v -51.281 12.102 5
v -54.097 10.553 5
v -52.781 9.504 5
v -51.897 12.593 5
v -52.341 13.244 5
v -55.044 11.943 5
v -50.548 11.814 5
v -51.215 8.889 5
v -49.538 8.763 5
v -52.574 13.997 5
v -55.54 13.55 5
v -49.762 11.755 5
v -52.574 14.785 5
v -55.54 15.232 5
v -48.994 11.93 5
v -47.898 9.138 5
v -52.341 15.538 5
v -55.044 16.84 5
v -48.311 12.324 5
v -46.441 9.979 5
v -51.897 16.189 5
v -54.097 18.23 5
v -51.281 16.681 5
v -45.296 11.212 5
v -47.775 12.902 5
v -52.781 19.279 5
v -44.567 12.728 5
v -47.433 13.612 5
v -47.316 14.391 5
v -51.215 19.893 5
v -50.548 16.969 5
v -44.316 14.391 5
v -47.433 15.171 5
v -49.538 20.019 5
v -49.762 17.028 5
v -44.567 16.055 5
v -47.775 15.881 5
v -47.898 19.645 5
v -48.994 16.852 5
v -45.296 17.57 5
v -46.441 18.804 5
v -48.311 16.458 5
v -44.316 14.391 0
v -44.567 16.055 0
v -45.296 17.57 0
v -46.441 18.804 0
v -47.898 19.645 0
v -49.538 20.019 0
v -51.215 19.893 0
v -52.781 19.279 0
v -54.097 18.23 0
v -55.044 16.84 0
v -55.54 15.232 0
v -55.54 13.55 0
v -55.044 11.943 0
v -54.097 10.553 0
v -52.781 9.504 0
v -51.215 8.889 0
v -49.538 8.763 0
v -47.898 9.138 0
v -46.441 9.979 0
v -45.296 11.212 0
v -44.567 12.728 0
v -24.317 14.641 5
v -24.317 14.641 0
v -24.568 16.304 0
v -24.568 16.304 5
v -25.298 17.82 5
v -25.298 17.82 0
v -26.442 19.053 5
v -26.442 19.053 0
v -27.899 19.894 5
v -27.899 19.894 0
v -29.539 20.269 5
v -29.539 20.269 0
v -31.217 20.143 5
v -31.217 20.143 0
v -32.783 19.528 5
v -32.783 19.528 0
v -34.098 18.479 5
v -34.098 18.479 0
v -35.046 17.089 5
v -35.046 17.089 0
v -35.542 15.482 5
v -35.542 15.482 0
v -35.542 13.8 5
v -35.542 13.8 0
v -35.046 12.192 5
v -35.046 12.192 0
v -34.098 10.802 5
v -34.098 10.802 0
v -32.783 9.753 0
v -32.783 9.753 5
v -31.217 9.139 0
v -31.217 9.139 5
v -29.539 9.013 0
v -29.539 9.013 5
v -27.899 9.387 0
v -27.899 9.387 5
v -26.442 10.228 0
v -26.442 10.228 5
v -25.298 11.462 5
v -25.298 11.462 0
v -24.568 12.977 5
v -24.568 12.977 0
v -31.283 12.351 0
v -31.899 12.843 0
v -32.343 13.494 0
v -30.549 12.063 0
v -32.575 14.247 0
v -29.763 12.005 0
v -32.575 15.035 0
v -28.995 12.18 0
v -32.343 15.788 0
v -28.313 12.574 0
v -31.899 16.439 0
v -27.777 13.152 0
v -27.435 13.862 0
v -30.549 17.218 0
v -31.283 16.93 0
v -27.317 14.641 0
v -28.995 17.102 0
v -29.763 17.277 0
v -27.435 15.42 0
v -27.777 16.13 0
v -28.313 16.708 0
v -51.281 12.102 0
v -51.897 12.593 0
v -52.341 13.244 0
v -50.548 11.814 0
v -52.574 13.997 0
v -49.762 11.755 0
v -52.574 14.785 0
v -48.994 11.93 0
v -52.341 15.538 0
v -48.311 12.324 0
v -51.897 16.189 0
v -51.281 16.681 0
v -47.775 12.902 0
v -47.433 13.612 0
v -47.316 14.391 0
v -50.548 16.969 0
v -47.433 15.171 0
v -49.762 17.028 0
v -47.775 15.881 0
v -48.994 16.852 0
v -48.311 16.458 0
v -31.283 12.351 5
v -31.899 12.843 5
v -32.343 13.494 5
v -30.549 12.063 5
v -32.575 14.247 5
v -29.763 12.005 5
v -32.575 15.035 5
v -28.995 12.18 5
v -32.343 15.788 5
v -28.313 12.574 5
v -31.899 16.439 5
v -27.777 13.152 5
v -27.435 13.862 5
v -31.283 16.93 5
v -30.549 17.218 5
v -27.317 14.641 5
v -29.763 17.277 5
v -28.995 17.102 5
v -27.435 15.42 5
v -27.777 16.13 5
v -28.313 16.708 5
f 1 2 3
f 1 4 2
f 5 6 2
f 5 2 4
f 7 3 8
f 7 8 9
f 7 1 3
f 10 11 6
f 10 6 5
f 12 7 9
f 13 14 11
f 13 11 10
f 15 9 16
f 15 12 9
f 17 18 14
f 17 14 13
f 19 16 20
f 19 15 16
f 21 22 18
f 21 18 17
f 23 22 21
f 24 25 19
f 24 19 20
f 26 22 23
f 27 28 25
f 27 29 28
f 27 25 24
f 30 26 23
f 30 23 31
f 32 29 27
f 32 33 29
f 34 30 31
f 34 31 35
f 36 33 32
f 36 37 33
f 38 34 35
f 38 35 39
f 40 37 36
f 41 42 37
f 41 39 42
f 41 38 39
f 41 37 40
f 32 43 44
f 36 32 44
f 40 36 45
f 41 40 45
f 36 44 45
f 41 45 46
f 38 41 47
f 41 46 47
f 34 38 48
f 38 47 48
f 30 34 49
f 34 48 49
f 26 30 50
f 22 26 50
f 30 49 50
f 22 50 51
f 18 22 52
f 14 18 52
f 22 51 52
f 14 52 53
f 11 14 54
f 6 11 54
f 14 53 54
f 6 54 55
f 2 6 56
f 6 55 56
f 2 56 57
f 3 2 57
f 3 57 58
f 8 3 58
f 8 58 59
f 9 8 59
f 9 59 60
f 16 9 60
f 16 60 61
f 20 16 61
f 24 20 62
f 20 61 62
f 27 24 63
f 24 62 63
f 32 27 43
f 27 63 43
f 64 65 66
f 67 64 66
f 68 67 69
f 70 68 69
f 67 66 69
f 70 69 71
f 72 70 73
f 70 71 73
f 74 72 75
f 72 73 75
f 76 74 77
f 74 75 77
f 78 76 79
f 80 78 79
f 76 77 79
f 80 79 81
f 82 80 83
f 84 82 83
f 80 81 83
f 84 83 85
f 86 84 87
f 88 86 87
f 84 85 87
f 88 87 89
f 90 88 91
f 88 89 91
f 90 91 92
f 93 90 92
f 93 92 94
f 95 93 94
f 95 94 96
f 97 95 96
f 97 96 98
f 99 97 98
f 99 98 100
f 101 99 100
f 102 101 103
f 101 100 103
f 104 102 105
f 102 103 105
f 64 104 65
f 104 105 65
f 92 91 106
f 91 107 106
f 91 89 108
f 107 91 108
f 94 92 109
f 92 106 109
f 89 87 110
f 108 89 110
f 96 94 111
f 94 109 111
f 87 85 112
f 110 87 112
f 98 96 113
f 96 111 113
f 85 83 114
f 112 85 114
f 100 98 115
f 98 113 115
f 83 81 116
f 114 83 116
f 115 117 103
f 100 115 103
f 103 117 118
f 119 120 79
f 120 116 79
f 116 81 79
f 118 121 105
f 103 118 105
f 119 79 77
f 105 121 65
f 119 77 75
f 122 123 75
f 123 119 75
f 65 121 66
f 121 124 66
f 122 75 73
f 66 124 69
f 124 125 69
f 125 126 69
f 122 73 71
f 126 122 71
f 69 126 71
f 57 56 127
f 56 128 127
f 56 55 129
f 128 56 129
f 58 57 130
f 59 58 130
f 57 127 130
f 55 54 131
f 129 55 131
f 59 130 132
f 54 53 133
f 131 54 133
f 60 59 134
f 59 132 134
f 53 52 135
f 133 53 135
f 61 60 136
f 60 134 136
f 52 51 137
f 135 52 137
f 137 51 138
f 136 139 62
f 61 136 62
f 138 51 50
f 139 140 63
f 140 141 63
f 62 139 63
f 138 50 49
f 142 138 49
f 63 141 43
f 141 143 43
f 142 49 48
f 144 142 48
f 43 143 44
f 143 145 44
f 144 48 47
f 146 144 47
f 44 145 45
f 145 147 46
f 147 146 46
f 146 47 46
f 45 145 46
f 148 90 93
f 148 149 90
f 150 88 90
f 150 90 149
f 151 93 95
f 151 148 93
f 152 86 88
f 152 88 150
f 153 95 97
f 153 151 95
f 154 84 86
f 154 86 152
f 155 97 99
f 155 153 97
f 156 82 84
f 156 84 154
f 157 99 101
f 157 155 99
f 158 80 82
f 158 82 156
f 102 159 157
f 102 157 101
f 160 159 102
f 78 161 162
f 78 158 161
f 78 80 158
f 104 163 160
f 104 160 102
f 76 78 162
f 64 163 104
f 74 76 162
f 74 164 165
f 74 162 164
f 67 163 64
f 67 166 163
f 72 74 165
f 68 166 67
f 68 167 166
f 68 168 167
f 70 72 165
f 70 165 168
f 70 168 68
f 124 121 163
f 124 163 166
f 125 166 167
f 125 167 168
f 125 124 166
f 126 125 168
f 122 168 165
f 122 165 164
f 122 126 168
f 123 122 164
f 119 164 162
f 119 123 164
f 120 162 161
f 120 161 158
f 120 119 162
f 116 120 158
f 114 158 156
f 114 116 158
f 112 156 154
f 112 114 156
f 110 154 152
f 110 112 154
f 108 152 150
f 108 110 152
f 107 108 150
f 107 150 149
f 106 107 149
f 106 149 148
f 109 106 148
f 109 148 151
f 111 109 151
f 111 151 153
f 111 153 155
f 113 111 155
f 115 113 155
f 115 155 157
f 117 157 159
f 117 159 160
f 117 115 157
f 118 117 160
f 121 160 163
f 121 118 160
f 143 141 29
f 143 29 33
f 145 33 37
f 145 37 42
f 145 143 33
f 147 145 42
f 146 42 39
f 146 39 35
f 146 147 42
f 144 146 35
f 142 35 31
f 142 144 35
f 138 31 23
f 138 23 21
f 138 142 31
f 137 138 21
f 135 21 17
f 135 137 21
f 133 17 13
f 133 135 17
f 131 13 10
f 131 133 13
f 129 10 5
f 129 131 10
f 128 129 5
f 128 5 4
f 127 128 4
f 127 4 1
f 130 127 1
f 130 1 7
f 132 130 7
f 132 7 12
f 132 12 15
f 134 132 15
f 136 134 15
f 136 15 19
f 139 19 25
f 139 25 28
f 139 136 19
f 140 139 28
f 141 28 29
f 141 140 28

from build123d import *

# Parameters (mm, degrees)
SKETCH_1_R        = 5.643613852
SKETCH_1_R_2      = 2.643613852
EXTRUDE_1_DEPTH   = 5
EXTRUDE_1_2_DEPTH = 5
SKETCH_1_2_R      = 5.643613852
SKETCH_1_2_R_2    = 2.643613852
EXTRUDE_2_DEPTH   = 5


with BuildPart() as part:
    # 草图1 → 凸台-拉伸1 (new body)
    with BuildSketch(Plane.XY):
        with Locations((-49.959466428, 14.391315389)):
            Circle(SKETCH_1_R)
        with Locations((-49.959466428, 14.391315389)):
            Circle(SKETCH_1_R_2, mode=Mode.SUBTRACT)
    extrude(amount=EXTRUDE_1_DEPTH)



with BuildPart() as body_2:
    # 草图1 → Extrude 1 2 (new body)
    with BuildSketch(Plane.XY):
        with Locations((-29.961022302, 14.640779915)):
            Circle(SKETCH_1_R)
        with Locations((-29.961022302, 14.640779915)):
            Circle(SKETCH_1_R_2, mode=Mode.SUBTRACT)
    extrude(amount=EXTRUDE_1_2_DEPTH)


with BuildPart() as part_1:
    add(part.part)

    add(body_2.part)  # 凸台-拉伸2 merges body 2
    # 草图1<2> → 凸台-拉伸2 (add)
    # profile 1 of 2: a face of its own
    with BuildSketch(Plane.XY):
        with Locations((-49.959466428, 14.391315389)):
            Circle(SKETCH_1_2_R)
        with Locations((-49.959466428, 14.391315389)):
            Circle(SKETCH_1_2_R_2, mode=Mode.SUBTRACT)
    # profile 2 of 2: a face of its own
    with BuildSketch(Plane.XY):
        with Locations((-29.961022302, 14.640779915)):
            Circle(SKETCH_1_2_R)
        with Locations((-29.961022302, 14.640779915)):
            Circle(SKETCH_1_2_R_2, mode=Mode.SUBTRACT)
    extrude(amount=EXTRUDE_2_DEPTH)


solid = part_1.part
